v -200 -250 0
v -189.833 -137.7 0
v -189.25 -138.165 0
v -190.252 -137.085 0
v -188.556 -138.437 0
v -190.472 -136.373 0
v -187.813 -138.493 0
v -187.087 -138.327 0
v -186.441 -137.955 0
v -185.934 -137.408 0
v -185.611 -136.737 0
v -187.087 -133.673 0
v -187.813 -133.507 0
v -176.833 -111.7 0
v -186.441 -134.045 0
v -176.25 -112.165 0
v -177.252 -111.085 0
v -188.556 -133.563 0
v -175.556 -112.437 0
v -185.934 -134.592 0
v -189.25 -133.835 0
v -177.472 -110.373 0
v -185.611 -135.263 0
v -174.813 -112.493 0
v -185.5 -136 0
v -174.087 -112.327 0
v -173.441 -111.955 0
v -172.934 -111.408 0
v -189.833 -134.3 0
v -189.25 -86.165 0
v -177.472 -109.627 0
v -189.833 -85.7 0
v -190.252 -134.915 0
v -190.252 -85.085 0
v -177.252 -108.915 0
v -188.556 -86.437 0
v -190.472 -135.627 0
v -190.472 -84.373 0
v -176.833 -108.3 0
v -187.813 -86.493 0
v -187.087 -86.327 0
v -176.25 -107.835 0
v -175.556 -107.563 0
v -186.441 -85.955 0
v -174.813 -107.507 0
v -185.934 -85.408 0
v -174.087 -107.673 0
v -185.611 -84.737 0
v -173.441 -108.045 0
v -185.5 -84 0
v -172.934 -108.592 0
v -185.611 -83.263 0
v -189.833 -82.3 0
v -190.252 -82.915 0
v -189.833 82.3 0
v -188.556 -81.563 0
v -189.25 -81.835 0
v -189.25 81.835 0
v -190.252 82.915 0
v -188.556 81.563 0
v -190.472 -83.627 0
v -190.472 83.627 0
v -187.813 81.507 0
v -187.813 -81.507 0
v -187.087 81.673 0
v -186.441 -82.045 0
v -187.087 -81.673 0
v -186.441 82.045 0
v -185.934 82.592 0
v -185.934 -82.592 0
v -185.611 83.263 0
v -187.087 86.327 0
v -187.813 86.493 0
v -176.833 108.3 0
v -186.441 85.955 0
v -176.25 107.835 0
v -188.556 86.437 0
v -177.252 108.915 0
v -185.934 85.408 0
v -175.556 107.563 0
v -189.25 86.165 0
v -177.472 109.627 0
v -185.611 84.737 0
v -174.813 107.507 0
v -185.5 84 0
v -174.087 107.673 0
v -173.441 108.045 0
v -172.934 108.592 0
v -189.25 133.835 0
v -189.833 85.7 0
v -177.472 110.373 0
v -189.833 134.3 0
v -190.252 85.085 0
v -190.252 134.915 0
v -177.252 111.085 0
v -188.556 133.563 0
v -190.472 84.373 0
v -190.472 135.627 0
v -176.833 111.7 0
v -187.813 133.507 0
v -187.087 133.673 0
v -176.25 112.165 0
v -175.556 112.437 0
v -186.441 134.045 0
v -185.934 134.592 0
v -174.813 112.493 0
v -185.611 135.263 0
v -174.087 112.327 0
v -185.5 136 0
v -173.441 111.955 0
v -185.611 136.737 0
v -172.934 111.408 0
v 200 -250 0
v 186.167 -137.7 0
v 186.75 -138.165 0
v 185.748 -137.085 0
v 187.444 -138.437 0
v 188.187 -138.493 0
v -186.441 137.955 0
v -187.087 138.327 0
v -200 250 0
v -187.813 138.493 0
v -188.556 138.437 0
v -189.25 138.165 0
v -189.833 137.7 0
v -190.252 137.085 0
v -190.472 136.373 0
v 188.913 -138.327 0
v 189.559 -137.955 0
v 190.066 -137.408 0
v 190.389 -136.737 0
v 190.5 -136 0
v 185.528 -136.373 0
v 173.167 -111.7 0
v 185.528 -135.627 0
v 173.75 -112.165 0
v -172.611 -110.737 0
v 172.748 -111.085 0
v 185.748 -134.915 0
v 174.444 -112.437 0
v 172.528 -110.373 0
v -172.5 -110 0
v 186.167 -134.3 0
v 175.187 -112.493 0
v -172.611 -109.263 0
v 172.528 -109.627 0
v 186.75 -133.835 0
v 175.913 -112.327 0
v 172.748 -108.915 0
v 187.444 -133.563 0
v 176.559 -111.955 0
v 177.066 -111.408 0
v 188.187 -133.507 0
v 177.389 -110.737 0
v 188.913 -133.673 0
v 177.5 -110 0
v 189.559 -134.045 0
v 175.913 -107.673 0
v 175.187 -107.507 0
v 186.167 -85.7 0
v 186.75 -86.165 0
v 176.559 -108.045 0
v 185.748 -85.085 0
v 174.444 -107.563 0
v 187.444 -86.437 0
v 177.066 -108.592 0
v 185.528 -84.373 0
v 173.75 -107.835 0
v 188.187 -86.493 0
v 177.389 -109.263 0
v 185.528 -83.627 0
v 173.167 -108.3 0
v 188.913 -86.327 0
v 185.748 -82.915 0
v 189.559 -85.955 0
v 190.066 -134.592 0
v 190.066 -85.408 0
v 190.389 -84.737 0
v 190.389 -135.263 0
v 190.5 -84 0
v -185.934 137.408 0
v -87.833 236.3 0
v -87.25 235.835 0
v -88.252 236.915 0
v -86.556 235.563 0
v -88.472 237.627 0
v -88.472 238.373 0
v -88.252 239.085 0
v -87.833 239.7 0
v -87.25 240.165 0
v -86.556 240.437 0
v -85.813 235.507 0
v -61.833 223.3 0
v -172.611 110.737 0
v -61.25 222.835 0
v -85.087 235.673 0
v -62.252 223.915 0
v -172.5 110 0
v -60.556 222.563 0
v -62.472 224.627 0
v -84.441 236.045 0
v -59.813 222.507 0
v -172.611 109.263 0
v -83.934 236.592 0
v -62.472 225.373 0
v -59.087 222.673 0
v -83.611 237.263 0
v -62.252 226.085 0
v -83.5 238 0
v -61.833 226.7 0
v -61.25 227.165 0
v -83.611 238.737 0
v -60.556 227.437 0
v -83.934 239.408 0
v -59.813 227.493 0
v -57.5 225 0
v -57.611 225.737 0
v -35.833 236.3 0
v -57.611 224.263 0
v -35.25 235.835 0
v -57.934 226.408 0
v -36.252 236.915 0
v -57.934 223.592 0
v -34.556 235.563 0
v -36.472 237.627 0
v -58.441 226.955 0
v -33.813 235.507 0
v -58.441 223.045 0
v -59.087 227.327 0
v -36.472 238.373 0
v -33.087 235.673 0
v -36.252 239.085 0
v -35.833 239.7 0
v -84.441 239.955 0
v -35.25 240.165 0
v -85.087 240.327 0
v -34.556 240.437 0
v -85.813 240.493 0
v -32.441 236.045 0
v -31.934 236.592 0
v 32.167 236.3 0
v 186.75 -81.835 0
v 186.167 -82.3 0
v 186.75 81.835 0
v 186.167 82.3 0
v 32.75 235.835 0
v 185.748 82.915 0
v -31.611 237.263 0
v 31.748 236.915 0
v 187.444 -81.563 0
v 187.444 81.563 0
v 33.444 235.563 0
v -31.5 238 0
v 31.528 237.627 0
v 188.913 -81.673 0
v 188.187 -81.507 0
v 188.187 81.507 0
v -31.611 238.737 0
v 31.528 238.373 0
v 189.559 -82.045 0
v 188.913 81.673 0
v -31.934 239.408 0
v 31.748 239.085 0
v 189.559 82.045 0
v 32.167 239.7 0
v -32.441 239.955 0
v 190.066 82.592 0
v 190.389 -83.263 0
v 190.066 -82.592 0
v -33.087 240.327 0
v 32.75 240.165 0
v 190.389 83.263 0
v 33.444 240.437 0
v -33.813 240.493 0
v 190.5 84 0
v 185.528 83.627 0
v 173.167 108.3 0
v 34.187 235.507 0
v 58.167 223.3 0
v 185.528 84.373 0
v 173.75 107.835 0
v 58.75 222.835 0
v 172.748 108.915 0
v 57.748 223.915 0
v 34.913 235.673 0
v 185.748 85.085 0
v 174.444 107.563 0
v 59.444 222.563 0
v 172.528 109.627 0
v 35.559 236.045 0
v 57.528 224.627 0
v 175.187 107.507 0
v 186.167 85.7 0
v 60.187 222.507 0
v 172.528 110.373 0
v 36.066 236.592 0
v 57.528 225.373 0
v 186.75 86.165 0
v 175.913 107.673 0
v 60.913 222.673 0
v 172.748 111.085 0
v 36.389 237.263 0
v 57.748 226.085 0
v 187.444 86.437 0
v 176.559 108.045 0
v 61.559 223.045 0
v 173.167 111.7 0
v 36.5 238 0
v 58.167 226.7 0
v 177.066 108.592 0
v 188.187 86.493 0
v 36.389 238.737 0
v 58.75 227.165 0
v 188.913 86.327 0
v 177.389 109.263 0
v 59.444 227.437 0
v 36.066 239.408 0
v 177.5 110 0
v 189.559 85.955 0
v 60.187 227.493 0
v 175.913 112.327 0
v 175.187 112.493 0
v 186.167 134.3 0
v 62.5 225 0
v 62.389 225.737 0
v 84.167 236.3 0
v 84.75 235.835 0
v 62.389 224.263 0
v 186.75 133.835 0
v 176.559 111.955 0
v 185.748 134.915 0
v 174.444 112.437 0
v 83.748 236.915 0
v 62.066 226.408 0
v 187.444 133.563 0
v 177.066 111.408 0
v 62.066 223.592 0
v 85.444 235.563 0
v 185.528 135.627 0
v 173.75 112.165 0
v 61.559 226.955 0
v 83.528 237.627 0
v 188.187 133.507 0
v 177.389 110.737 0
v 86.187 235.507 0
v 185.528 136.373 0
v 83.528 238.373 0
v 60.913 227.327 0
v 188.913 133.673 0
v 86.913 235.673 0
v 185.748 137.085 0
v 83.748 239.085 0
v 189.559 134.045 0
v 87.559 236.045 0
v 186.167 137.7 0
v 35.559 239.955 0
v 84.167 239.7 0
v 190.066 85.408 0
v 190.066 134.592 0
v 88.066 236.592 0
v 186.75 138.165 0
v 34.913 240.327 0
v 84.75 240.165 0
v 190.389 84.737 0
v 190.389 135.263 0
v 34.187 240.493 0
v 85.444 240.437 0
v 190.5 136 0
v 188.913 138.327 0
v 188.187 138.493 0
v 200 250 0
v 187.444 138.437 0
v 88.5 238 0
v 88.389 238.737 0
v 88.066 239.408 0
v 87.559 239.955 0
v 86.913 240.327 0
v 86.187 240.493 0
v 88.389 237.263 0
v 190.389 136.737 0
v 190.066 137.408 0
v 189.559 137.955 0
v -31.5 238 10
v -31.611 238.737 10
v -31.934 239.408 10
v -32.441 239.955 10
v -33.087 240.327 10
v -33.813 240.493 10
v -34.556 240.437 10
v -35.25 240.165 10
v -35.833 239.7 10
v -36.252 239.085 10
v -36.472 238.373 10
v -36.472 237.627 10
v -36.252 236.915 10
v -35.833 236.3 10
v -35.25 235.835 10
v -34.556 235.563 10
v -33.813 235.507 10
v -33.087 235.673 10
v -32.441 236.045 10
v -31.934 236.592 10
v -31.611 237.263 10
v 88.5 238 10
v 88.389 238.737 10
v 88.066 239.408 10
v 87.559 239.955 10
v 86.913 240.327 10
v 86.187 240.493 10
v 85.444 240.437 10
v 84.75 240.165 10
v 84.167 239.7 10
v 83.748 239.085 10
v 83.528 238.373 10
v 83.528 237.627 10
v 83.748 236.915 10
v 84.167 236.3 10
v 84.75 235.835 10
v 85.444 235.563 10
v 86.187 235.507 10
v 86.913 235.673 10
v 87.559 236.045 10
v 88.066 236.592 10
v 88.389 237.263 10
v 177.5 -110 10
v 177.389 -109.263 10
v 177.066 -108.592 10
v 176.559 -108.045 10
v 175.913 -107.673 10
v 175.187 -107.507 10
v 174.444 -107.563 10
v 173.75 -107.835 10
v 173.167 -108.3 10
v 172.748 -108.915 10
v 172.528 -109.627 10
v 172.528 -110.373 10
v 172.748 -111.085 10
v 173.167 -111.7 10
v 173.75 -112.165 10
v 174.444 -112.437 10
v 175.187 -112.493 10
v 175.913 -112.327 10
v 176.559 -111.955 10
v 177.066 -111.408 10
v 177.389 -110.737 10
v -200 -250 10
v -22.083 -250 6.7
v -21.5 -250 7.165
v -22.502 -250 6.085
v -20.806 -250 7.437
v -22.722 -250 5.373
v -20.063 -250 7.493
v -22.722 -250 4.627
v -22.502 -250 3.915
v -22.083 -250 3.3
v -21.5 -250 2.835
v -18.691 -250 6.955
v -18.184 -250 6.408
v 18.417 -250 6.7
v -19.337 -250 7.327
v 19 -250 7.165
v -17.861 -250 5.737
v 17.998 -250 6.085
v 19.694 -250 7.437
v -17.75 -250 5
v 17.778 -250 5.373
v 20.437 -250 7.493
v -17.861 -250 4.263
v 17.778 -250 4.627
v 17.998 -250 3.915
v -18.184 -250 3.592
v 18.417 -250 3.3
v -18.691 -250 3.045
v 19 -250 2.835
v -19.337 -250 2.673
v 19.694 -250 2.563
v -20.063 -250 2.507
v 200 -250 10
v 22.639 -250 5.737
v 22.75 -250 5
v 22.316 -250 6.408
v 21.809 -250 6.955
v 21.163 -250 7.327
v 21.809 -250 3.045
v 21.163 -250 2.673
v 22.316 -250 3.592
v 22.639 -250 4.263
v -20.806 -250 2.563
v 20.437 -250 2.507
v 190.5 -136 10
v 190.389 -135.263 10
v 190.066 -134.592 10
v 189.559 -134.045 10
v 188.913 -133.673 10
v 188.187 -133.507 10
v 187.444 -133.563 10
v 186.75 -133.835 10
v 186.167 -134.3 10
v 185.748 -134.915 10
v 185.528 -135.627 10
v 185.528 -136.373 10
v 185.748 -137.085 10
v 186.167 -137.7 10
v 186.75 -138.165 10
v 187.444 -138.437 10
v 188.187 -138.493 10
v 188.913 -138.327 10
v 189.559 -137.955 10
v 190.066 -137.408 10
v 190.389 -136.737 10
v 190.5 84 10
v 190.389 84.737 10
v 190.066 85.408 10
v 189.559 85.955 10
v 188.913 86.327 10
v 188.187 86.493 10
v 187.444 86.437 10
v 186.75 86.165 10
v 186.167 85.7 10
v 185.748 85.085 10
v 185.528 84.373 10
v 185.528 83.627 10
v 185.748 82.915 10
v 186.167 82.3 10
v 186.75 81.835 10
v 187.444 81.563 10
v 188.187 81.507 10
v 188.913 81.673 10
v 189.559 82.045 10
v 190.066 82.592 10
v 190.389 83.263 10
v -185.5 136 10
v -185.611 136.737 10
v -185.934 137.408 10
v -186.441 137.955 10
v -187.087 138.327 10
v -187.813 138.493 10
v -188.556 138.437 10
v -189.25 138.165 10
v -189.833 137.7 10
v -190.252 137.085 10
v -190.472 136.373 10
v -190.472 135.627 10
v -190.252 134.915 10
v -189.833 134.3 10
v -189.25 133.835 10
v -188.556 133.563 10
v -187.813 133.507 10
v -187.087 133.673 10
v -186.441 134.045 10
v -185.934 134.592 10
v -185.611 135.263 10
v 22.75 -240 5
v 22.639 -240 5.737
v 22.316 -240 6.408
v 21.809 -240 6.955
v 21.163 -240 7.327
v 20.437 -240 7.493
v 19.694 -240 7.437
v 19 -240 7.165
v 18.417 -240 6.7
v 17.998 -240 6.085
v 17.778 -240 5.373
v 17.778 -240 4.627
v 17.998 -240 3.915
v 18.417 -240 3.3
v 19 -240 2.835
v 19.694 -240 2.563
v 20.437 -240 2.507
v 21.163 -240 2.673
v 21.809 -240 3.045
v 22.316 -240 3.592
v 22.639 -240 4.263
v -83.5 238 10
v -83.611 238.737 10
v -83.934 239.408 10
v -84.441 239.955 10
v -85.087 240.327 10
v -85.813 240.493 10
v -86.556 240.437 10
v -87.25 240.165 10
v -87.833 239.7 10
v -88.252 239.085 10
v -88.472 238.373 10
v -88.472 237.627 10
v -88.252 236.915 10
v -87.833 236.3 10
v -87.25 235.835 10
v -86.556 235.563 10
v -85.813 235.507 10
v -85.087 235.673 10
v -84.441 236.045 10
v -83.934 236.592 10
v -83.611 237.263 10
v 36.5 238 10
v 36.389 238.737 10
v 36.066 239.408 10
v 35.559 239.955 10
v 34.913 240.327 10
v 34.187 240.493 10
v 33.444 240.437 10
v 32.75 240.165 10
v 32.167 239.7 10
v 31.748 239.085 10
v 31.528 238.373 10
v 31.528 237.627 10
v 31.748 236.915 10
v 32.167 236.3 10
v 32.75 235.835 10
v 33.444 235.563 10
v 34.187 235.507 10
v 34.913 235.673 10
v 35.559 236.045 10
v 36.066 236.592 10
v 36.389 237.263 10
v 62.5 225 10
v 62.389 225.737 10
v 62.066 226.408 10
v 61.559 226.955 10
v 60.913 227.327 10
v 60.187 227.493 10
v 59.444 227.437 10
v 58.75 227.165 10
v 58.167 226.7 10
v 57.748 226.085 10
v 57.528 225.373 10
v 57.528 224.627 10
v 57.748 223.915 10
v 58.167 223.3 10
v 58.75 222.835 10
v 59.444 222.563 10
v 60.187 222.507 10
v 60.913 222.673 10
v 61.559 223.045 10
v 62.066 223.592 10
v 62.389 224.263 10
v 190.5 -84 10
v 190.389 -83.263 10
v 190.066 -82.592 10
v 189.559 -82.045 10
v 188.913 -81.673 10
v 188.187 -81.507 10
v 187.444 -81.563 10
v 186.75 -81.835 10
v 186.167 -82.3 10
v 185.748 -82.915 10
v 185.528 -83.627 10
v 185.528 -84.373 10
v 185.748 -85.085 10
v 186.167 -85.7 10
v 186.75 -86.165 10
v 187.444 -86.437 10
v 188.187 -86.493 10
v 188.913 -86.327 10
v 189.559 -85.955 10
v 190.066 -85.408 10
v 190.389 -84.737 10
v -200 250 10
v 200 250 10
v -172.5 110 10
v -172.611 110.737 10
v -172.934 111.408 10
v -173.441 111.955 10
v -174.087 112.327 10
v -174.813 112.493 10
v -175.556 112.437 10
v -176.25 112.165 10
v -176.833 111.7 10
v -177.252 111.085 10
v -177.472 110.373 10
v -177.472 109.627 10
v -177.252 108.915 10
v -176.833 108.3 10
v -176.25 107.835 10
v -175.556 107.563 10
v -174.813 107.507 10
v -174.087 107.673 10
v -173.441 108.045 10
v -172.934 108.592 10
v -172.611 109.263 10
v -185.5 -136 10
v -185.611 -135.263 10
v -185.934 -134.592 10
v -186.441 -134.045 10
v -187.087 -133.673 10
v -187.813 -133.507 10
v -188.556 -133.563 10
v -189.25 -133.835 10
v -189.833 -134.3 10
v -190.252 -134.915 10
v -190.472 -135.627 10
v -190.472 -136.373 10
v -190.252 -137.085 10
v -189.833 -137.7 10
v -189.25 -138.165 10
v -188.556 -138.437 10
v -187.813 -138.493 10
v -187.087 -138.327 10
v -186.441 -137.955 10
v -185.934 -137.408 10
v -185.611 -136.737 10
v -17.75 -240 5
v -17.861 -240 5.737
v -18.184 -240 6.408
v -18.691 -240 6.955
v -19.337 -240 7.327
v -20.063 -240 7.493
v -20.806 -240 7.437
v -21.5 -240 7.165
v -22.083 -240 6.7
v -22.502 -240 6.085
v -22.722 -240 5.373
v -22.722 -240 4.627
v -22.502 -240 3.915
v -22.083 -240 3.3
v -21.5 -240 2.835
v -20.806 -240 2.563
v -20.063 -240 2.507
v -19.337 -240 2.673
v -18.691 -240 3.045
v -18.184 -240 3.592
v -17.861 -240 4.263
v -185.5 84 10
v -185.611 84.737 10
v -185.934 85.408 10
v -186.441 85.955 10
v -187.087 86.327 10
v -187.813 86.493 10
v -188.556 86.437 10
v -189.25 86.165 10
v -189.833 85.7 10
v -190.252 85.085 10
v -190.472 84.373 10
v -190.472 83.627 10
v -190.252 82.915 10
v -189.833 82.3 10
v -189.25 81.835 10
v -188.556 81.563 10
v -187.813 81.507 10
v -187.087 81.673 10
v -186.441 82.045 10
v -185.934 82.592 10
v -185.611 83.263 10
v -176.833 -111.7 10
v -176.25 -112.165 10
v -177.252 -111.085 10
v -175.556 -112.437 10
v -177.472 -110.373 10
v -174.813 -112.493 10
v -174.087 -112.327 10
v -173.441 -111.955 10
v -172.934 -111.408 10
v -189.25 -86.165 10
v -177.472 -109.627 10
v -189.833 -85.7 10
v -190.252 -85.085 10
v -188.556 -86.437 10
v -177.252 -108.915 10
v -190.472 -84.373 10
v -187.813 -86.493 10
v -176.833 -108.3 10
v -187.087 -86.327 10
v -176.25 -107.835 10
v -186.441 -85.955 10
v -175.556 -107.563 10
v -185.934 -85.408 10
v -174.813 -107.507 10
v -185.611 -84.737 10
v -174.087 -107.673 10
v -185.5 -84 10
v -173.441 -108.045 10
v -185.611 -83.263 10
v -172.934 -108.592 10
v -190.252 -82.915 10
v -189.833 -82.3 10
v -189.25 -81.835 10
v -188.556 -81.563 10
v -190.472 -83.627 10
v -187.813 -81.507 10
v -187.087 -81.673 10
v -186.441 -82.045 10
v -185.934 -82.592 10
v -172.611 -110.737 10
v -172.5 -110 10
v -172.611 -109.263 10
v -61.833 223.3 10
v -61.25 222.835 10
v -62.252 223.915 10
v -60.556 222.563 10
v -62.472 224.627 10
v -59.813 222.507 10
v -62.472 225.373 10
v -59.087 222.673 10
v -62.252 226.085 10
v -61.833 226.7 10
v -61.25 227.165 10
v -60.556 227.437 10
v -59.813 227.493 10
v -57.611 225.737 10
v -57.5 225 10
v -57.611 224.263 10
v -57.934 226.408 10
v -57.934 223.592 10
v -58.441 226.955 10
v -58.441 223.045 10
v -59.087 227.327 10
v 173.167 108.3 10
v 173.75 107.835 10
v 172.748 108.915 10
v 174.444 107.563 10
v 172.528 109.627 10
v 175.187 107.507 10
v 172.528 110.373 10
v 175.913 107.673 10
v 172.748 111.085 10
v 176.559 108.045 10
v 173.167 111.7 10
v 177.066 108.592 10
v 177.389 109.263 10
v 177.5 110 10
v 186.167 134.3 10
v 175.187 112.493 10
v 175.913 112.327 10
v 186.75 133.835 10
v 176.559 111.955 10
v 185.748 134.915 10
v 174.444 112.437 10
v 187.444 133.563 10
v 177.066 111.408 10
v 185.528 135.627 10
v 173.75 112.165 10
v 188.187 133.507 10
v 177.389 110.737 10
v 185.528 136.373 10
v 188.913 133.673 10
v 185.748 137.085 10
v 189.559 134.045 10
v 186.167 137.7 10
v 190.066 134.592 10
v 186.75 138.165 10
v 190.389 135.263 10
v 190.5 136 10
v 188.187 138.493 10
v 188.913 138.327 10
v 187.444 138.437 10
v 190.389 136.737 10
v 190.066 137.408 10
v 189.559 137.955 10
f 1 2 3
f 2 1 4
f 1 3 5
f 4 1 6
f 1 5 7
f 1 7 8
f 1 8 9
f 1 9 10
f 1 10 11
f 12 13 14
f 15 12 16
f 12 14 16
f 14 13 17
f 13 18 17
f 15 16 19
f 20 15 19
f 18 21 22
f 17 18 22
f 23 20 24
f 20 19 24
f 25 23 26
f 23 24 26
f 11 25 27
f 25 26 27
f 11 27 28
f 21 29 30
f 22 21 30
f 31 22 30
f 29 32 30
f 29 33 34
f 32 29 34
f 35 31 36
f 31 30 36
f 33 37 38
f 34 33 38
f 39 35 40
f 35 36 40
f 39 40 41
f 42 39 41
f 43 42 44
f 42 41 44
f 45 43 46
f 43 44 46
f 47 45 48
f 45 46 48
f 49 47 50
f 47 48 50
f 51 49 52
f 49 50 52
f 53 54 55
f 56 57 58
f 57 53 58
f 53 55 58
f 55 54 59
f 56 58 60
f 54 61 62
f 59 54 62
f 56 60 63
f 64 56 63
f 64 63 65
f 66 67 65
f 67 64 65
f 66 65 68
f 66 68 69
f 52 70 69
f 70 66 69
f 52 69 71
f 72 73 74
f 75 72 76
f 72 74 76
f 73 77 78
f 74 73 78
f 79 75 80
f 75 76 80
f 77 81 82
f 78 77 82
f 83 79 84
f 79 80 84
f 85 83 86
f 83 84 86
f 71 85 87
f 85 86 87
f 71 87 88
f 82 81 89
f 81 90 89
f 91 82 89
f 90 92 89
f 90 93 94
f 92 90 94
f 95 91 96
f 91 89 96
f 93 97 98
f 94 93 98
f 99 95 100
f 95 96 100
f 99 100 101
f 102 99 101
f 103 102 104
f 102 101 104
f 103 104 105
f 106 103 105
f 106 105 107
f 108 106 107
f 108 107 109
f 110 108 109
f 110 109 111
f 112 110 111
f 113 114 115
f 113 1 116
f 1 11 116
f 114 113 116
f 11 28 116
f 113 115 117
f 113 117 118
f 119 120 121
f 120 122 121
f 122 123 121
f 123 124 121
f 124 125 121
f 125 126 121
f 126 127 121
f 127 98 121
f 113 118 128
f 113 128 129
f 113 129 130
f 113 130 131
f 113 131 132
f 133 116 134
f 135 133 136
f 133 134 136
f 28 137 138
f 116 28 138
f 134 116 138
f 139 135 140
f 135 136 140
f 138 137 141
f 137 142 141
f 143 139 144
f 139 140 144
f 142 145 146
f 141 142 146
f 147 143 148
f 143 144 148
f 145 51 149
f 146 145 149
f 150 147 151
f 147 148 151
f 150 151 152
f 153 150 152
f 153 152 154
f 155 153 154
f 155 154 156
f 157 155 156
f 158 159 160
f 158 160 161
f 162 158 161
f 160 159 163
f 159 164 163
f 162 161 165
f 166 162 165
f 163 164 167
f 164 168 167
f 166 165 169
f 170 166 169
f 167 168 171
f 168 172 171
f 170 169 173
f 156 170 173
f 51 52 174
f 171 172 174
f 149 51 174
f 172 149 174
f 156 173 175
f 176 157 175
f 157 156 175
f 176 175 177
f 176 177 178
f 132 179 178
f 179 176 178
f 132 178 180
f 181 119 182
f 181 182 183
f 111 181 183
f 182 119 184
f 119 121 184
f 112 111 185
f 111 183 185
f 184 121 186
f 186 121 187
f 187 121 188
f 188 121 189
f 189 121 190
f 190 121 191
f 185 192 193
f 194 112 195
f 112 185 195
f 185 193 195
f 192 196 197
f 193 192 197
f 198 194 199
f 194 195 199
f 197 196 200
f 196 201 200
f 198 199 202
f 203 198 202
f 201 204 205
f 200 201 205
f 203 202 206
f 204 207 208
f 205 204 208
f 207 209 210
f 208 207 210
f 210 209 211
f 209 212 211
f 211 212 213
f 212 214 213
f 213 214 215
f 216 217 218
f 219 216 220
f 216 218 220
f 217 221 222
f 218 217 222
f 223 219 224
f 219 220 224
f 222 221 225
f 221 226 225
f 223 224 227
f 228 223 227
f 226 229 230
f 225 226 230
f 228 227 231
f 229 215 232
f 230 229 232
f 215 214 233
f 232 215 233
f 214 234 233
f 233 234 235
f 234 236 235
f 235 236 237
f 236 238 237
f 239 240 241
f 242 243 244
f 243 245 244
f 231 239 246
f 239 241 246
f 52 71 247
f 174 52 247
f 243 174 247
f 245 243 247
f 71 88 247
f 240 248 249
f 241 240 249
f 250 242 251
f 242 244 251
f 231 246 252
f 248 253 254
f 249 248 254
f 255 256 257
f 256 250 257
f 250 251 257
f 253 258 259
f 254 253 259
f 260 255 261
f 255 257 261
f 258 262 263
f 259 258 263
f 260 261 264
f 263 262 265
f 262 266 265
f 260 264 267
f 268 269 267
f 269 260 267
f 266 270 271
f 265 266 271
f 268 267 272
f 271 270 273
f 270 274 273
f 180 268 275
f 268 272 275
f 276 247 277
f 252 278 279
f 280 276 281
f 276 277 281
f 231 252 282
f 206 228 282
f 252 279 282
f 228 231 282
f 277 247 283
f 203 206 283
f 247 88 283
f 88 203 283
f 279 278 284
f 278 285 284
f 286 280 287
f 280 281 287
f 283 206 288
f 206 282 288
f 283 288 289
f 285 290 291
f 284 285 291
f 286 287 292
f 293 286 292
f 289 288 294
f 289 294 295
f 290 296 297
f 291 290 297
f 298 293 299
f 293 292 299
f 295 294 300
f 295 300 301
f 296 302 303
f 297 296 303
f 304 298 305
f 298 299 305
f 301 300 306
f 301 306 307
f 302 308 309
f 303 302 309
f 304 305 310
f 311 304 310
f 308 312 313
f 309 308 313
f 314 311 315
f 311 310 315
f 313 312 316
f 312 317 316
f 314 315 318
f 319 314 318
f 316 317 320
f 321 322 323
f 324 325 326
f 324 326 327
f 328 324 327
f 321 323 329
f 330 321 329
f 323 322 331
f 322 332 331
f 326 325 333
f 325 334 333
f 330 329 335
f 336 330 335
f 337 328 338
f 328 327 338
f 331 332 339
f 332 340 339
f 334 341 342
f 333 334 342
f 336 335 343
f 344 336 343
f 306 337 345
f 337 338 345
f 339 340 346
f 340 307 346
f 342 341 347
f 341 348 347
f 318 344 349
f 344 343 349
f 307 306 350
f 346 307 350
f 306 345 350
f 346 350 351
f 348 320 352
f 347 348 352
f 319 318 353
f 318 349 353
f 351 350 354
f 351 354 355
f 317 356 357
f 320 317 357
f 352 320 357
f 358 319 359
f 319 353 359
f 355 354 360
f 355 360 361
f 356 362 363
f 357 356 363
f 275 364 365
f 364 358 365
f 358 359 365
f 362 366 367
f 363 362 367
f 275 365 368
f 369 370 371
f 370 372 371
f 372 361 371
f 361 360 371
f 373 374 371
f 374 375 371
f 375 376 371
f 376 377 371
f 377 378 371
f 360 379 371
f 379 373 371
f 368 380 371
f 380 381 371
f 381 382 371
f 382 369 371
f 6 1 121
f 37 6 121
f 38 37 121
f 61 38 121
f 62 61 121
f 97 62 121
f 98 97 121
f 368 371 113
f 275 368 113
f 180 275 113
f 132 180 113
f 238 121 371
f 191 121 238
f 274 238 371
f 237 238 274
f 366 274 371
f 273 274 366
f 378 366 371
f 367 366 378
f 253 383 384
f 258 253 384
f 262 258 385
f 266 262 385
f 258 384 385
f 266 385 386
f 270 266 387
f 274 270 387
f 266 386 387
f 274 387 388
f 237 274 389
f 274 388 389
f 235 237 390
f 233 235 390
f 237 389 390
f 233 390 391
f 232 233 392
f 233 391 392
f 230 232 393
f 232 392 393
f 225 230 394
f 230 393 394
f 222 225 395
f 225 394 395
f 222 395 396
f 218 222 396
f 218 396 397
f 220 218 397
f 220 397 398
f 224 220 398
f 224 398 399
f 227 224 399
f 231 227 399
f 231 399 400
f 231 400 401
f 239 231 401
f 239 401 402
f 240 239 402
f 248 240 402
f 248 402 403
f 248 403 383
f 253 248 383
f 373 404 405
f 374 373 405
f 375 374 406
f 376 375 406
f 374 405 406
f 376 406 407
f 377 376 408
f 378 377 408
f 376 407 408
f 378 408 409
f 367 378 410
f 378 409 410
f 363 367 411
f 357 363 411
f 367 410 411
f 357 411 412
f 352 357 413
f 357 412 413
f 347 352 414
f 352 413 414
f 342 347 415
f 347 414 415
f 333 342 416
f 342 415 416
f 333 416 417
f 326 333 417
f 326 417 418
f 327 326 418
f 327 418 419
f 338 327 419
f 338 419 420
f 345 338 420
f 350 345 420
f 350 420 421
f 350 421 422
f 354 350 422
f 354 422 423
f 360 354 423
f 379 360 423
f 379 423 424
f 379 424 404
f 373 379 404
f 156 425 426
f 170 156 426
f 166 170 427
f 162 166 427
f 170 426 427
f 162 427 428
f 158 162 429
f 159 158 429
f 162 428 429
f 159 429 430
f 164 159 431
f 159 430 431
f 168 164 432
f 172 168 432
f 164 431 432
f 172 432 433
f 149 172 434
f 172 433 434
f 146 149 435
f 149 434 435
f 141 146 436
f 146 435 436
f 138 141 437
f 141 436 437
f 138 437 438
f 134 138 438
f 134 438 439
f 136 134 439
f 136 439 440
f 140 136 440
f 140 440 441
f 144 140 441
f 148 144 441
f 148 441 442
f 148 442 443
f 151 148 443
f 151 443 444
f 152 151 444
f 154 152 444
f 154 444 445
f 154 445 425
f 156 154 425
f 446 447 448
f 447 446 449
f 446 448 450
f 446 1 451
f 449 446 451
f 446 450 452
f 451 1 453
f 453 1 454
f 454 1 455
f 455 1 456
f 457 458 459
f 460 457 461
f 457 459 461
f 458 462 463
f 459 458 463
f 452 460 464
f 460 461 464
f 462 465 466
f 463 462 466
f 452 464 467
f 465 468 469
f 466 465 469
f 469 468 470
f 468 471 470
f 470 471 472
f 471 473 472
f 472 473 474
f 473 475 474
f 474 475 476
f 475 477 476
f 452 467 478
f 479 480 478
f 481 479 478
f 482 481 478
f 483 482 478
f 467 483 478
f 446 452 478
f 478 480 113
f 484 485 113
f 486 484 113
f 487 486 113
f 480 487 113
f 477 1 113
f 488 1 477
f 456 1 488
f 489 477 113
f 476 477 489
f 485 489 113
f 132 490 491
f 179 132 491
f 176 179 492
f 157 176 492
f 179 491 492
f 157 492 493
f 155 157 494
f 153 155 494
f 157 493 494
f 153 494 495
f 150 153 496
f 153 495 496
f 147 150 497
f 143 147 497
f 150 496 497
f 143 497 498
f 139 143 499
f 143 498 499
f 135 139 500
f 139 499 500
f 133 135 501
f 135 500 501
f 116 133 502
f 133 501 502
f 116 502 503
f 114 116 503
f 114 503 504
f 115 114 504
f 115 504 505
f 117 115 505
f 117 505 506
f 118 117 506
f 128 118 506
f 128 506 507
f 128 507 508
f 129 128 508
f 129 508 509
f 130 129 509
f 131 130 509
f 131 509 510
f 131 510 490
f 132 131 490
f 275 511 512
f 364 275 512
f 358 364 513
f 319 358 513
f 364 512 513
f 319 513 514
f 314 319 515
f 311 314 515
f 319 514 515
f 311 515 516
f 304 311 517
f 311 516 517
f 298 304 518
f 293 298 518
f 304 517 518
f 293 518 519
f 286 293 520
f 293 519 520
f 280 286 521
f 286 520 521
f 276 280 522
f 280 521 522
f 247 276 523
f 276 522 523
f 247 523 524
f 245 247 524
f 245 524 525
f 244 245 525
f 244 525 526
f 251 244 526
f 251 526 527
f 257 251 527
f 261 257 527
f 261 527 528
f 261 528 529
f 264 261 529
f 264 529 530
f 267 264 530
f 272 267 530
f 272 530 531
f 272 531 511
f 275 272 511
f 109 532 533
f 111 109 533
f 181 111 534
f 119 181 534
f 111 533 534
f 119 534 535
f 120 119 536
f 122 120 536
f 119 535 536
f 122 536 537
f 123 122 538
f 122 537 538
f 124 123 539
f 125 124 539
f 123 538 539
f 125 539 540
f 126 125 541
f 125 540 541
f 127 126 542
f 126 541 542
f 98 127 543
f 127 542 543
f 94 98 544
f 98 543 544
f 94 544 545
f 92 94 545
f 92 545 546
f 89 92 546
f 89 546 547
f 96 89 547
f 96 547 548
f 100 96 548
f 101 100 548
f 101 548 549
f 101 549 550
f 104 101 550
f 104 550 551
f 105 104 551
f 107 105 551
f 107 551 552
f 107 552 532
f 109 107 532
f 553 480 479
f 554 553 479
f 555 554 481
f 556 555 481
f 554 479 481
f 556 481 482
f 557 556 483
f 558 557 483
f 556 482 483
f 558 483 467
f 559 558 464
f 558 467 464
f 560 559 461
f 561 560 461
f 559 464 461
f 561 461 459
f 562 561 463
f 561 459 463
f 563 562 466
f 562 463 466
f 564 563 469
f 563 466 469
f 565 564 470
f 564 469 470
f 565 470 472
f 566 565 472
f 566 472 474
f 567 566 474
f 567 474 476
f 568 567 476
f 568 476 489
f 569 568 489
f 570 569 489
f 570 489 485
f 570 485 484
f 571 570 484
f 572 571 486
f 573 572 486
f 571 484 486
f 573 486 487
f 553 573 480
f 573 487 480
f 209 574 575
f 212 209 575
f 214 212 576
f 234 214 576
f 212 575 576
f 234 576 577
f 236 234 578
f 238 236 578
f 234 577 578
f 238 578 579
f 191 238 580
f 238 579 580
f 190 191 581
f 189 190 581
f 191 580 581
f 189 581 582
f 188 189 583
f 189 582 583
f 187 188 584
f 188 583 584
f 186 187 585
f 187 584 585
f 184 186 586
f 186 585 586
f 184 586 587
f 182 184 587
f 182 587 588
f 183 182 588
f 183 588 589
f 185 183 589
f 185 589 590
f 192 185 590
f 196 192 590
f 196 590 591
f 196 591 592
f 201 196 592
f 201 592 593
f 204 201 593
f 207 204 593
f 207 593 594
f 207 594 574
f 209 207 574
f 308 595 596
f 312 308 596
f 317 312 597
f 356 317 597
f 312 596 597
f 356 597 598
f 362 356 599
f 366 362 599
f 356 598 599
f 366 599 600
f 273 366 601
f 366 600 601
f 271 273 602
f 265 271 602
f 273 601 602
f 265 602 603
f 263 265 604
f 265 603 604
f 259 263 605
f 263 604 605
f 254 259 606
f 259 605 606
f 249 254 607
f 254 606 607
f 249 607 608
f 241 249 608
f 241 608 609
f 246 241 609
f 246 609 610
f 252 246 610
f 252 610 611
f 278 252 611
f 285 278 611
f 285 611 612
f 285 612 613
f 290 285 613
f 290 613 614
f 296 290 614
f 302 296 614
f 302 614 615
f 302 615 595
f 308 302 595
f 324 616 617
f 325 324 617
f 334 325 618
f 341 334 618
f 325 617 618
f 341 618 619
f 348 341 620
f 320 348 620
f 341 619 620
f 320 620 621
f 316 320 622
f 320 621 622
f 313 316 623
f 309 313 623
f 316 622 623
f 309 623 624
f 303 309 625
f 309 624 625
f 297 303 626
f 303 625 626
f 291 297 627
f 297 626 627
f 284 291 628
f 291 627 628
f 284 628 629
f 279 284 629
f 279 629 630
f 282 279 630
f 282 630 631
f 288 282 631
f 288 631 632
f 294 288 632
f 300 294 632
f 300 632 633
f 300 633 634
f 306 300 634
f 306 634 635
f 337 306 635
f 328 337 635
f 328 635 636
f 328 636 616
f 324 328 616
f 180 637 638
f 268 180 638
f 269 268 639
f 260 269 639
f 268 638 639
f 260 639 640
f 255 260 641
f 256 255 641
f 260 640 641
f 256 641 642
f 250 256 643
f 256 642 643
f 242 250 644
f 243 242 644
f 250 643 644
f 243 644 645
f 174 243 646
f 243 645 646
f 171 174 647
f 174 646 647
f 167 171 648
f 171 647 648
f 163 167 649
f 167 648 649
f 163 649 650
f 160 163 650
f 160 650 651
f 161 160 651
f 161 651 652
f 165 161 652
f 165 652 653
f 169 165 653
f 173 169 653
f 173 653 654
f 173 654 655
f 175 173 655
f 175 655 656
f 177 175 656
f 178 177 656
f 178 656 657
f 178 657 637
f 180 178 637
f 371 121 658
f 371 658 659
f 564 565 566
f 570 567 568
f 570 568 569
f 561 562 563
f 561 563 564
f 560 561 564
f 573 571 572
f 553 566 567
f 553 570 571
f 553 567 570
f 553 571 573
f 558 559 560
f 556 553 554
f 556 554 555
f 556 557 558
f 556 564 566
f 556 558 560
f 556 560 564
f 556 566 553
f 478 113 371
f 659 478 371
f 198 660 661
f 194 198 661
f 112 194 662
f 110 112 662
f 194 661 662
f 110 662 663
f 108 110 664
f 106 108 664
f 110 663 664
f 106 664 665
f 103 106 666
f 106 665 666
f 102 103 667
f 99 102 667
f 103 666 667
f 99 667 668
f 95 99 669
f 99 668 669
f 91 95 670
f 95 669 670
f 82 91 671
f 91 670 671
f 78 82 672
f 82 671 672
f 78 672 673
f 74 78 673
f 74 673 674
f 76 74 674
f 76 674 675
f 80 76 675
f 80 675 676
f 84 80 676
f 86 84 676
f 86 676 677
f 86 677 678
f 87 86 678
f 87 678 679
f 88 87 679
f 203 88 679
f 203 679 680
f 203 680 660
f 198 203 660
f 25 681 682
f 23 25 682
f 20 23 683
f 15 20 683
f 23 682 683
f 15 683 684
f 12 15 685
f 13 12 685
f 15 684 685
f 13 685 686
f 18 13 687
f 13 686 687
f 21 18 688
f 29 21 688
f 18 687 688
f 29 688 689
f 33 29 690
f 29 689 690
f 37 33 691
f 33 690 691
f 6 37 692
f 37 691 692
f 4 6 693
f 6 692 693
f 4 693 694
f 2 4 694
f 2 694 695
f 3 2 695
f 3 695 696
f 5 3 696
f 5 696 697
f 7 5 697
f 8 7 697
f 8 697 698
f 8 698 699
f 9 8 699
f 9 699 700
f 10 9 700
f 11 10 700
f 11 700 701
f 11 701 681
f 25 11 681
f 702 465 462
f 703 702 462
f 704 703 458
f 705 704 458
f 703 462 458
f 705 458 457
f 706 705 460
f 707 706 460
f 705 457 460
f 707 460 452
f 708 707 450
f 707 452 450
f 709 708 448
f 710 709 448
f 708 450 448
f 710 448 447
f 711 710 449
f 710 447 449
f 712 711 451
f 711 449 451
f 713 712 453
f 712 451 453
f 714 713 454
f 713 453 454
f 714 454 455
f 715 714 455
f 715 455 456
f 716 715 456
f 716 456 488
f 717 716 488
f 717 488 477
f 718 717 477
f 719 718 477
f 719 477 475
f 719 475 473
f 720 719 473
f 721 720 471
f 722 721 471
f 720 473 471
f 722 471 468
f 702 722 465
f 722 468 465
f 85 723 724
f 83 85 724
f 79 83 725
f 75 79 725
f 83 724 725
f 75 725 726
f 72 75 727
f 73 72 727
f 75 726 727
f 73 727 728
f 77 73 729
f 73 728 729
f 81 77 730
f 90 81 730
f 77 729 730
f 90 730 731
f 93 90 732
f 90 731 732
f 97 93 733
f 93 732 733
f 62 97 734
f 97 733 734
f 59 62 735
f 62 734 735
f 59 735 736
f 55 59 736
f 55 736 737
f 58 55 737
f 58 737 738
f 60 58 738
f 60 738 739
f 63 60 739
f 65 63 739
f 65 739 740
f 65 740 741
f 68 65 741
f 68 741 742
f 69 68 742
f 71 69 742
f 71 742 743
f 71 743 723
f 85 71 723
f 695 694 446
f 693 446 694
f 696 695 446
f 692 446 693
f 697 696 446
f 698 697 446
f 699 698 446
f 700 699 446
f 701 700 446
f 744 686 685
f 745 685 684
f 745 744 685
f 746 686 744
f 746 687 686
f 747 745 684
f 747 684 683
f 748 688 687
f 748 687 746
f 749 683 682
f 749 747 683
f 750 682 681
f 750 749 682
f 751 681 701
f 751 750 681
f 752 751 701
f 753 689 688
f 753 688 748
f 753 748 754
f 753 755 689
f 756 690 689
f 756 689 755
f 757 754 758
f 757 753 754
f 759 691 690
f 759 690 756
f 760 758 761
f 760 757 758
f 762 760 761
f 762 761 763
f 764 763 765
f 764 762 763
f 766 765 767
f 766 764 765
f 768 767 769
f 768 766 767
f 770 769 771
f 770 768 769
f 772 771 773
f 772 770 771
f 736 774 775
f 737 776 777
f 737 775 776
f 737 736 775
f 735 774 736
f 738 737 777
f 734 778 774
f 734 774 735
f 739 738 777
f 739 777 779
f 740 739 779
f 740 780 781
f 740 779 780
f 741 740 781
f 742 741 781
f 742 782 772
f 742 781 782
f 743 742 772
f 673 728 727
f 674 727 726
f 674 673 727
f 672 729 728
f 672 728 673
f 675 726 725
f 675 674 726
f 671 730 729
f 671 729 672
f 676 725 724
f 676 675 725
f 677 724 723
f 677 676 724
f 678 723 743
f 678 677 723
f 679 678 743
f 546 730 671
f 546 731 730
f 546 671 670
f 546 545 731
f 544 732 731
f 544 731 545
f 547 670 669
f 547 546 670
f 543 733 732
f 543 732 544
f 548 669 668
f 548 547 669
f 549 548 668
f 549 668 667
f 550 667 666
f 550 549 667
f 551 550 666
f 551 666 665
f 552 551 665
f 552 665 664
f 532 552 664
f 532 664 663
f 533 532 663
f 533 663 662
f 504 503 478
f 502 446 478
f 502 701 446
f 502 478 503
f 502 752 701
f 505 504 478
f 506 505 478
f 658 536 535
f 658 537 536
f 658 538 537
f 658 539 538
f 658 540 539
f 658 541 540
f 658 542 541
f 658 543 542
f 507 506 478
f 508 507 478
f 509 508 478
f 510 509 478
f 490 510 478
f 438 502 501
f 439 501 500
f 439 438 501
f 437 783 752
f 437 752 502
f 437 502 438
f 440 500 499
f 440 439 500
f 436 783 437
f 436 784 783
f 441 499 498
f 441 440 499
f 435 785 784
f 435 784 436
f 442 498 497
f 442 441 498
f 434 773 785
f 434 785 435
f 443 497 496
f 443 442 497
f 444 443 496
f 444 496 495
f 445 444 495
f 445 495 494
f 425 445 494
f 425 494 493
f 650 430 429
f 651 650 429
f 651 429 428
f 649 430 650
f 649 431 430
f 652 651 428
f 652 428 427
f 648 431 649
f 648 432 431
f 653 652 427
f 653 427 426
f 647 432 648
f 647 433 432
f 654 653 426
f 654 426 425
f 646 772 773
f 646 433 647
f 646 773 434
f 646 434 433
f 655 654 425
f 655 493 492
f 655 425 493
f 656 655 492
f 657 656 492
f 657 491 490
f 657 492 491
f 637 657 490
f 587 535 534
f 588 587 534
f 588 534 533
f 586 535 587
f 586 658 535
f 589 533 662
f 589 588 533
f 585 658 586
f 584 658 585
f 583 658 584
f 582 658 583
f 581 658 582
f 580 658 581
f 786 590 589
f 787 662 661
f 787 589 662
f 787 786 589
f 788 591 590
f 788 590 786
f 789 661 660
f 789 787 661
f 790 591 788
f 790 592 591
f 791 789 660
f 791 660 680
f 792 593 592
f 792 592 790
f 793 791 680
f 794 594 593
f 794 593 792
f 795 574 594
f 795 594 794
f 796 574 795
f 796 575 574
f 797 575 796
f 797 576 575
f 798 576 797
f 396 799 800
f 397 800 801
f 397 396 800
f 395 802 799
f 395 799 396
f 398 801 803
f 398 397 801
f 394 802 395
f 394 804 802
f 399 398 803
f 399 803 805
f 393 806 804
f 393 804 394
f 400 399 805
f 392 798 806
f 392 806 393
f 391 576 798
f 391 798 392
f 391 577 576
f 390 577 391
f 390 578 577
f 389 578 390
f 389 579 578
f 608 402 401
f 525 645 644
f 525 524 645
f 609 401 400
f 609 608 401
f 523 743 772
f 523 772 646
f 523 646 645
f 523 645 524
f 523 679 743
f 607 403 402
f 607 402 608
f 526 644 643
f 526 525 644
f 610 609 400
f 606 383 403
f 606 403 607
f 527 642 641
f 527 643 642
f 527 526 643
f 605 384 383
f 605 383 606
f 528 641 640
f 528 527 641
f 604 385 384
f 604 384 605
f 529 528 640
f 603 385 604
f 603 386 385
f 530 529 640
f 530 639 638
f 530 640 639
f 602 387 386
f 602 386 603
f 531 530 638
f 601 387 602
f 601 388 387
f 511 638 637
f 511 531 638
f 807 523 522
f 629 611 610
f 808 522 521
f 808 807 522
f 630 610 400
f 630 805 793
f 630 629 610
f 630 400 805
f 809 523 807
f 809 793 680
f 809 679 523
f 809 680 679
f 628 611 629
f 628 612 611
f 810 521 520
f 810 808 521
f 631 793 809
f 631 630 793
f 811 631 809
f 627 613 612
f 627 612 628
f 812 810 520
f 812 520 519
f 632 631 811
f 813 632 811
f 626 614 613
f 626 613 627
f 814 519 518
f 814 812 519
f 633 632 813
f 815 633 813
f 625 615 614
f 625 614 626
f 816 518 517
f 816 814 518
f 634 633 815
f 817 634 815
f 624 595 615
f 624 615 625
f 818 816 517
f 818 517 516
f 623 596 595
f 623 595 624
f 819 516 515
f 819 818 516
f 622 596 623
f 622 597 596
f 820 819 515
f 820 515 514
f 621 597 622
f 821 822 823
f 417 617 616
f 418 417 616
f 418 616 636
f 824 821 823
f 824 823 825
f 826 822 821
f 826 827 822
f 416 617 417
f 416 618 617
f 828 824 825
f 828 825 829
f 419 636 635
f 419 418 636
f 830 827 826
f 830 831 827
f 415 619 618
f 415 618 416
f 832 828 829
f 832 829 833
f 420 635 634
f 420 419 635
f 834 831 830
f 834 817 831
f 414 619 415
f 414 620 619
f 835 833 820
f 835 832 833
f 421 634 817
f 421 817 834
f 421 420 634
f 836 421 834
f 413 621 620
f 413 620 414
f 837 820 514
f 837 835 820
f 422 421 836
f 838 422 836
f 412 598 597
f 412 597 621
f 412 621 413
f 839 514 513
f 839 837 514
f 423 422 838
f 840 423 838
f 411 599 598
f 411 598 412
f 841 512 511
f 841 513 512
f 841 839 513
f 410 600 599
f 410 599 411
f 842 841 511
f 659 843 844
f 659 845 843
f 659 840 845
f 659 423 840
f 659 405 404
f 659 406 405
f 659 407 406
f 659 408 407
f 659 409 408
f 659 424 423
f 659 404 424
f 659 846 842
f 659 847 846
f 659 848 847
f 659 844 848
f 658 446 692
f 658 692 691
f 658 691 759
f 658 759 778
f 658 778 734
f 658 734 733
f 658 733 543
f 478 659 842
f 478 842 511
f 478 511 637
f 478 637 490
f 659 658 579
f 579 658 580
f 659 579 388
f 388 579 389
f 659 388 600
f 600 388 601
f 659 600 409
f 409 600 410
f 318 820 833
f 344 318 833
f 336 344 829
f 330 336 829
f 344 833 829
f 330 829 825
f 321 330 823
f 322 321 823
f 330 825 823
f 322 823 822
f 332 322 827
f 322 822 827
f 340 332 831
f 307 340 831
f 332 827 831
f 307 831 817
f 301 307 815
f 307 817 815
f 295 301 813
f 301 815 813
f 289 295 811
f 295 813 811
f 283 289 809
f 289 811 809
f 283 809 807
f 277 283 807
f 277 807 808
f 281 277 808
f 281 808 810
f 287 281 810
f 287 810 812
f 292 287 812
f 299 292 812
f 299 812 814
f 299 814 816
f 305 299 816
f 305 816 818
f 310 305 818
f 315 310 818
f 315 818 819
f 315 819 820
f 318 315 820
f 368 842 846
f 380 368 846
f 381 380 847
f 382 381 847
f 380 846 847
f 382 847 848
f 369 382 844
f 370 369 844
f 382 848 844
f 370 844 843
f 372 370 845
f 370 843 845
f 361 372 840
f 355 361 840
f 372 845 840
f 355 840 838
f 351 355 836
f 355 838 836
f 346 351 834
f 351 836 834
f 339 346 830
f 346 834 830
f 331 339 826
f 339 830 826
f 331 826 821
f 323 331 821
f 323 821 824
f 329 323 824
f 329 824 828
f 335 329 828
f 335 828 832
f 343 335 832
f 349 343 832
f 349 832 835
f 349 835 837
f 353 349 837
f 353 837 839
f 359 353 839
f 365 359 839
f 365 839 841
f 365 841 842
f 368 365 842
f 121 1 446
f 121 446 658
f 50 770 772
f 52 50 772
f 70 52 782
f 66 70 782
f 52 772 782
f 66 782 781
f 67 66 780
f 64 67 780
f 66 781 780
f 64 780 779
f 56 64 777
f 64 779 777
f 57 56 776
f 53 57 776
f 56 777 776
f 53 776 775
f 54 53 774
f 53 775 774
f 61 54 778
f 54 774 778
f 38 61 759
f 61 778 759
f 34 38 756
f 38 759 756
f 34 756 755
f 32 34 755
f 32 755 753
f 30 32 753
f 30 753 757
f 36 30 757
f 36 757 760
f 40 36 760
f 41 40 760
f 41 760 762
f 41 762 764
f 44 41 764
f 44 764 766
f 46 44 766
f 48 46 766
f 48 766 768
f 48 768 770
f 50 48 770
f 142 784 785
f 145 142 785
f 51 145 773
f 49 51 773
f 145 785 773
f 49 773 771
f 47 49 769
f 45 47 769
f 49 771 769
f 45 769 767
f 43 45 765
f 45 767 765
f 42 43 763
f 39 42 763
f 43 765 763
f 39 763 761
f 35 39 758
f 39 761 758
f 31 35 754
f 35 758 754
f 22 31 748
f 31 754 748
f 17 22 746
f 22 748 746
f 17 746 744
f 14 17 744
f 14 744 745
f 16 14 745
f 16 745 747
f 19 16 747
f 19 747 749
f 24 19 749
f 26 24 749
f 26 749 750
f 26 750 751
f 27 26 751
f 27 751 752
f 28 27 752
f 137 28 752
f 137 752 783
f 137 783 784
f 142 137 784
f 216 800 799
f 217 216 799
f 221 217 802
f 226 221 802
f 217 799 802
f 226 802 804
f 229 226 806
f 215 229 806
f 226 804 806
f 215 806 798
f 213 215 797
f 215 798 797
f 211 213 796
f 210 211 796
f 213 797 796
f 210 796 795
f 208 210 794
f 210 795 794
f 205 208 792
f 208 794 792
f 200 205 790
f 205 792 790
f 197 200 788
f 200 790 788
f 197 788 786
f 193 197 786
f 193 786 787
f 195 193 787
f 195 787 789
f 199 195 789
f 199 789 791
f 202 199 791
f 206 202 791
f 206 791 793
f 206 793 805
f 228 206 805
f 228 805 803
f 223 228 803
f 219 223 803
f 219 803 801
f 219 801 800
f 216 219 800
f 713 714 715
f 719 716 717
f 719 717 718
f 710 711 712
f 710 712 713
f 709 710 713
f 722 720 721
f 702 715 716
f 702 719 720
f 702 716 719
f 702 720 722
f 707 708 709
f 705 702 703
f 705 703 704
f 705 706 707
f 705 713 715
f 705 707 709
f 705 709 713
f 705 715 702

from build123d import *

# Parameters (mm, degrees)
SKETCH1_W           = 400
SKETCH1_H           = 500
BOSS_EXTRUDE1_DEPTH = 10
SKETCH2_R           = 2.5
CUT_EXTRUDE1_DEPTH  = 321.312347561
SKETCH3_R           = 2.5
CUT_EXTRUDE2_DEPTH  = 10


with BuildPart() as part:
    # Sketch1 → Boss-Extrude1 (new body)
    with BuildSketch(Plane.XY):
        Rectangle(SKETCH1_W, SKETCH1_H)
    extrude(amount=BOSS_EXTRUDE1_DEPTH)

    # Sketch2 → Cut-Extrude1 (cut, through all)
    with BuildSketch(Plane.XY.offset(10)):
        with Locations((-188, -136)):
            Circle(SKETCH2_R)
        with Locations((-175, -110)):
            Circle(SKETCH2_R)
        with Locations((-188, -84)):
            Circle(SKETCH2_R)
        with Locations((-188, 136)):
            Circle(SKETCH2_R)
        with Locations((-175, 110)):
            Circle(SKETCH2_R)
        with Locations((-188, 84)):
            Circle(SKETCH2_R)
        with Locations((-86, 238)):
            Circle(SKETCH2_R)
        with Locations((-60, 225)):
            Circle(SKETCH2_R)
        with Locations((-34, 238)):
            Circle(SKETCH2_R)
        with Locations((34, 238)):
            Circle(SKETCH2_R)
        with Locations((60, 225)):
            Circle(SKETCH2_R)
        with Locations((86, 238)):
            Circle(SKETCH2_R)
        with Locations((175, 110)):
            Circle(SKETCH2_R)
        with Locations((188, 136)):
            Circle(SKETCH2_R)
        with Locations((188, 84)):
            Circle(SKETCH2_R)
        with Locations((188, -84)):
            Circle(SKETCH2_R)
        with Locations((175, -110)):
            Circle(SKETCH2_R)
        with Locations((188, -136)):
            Circle(SKETCH2_R)
    extrude(amount=-CUT_EXTRUDE1_DEPTH, mode=Mode.SUBTRACT)

    # Sketch3 → Cut-Extrude2 (cut)
    with BuildSketch(Plane.XZ.offset(250)):
        with Locations((-20.25, 5)):
            Circle(SKETCH3_R)
        with Locations((20.25, 5)):
            Circle(SKETCH3_R)
    extrude(amount=-CUT_EXTRUDE2_DEPTH, mode=Mode.SUBTRACT)


solid = part.part
